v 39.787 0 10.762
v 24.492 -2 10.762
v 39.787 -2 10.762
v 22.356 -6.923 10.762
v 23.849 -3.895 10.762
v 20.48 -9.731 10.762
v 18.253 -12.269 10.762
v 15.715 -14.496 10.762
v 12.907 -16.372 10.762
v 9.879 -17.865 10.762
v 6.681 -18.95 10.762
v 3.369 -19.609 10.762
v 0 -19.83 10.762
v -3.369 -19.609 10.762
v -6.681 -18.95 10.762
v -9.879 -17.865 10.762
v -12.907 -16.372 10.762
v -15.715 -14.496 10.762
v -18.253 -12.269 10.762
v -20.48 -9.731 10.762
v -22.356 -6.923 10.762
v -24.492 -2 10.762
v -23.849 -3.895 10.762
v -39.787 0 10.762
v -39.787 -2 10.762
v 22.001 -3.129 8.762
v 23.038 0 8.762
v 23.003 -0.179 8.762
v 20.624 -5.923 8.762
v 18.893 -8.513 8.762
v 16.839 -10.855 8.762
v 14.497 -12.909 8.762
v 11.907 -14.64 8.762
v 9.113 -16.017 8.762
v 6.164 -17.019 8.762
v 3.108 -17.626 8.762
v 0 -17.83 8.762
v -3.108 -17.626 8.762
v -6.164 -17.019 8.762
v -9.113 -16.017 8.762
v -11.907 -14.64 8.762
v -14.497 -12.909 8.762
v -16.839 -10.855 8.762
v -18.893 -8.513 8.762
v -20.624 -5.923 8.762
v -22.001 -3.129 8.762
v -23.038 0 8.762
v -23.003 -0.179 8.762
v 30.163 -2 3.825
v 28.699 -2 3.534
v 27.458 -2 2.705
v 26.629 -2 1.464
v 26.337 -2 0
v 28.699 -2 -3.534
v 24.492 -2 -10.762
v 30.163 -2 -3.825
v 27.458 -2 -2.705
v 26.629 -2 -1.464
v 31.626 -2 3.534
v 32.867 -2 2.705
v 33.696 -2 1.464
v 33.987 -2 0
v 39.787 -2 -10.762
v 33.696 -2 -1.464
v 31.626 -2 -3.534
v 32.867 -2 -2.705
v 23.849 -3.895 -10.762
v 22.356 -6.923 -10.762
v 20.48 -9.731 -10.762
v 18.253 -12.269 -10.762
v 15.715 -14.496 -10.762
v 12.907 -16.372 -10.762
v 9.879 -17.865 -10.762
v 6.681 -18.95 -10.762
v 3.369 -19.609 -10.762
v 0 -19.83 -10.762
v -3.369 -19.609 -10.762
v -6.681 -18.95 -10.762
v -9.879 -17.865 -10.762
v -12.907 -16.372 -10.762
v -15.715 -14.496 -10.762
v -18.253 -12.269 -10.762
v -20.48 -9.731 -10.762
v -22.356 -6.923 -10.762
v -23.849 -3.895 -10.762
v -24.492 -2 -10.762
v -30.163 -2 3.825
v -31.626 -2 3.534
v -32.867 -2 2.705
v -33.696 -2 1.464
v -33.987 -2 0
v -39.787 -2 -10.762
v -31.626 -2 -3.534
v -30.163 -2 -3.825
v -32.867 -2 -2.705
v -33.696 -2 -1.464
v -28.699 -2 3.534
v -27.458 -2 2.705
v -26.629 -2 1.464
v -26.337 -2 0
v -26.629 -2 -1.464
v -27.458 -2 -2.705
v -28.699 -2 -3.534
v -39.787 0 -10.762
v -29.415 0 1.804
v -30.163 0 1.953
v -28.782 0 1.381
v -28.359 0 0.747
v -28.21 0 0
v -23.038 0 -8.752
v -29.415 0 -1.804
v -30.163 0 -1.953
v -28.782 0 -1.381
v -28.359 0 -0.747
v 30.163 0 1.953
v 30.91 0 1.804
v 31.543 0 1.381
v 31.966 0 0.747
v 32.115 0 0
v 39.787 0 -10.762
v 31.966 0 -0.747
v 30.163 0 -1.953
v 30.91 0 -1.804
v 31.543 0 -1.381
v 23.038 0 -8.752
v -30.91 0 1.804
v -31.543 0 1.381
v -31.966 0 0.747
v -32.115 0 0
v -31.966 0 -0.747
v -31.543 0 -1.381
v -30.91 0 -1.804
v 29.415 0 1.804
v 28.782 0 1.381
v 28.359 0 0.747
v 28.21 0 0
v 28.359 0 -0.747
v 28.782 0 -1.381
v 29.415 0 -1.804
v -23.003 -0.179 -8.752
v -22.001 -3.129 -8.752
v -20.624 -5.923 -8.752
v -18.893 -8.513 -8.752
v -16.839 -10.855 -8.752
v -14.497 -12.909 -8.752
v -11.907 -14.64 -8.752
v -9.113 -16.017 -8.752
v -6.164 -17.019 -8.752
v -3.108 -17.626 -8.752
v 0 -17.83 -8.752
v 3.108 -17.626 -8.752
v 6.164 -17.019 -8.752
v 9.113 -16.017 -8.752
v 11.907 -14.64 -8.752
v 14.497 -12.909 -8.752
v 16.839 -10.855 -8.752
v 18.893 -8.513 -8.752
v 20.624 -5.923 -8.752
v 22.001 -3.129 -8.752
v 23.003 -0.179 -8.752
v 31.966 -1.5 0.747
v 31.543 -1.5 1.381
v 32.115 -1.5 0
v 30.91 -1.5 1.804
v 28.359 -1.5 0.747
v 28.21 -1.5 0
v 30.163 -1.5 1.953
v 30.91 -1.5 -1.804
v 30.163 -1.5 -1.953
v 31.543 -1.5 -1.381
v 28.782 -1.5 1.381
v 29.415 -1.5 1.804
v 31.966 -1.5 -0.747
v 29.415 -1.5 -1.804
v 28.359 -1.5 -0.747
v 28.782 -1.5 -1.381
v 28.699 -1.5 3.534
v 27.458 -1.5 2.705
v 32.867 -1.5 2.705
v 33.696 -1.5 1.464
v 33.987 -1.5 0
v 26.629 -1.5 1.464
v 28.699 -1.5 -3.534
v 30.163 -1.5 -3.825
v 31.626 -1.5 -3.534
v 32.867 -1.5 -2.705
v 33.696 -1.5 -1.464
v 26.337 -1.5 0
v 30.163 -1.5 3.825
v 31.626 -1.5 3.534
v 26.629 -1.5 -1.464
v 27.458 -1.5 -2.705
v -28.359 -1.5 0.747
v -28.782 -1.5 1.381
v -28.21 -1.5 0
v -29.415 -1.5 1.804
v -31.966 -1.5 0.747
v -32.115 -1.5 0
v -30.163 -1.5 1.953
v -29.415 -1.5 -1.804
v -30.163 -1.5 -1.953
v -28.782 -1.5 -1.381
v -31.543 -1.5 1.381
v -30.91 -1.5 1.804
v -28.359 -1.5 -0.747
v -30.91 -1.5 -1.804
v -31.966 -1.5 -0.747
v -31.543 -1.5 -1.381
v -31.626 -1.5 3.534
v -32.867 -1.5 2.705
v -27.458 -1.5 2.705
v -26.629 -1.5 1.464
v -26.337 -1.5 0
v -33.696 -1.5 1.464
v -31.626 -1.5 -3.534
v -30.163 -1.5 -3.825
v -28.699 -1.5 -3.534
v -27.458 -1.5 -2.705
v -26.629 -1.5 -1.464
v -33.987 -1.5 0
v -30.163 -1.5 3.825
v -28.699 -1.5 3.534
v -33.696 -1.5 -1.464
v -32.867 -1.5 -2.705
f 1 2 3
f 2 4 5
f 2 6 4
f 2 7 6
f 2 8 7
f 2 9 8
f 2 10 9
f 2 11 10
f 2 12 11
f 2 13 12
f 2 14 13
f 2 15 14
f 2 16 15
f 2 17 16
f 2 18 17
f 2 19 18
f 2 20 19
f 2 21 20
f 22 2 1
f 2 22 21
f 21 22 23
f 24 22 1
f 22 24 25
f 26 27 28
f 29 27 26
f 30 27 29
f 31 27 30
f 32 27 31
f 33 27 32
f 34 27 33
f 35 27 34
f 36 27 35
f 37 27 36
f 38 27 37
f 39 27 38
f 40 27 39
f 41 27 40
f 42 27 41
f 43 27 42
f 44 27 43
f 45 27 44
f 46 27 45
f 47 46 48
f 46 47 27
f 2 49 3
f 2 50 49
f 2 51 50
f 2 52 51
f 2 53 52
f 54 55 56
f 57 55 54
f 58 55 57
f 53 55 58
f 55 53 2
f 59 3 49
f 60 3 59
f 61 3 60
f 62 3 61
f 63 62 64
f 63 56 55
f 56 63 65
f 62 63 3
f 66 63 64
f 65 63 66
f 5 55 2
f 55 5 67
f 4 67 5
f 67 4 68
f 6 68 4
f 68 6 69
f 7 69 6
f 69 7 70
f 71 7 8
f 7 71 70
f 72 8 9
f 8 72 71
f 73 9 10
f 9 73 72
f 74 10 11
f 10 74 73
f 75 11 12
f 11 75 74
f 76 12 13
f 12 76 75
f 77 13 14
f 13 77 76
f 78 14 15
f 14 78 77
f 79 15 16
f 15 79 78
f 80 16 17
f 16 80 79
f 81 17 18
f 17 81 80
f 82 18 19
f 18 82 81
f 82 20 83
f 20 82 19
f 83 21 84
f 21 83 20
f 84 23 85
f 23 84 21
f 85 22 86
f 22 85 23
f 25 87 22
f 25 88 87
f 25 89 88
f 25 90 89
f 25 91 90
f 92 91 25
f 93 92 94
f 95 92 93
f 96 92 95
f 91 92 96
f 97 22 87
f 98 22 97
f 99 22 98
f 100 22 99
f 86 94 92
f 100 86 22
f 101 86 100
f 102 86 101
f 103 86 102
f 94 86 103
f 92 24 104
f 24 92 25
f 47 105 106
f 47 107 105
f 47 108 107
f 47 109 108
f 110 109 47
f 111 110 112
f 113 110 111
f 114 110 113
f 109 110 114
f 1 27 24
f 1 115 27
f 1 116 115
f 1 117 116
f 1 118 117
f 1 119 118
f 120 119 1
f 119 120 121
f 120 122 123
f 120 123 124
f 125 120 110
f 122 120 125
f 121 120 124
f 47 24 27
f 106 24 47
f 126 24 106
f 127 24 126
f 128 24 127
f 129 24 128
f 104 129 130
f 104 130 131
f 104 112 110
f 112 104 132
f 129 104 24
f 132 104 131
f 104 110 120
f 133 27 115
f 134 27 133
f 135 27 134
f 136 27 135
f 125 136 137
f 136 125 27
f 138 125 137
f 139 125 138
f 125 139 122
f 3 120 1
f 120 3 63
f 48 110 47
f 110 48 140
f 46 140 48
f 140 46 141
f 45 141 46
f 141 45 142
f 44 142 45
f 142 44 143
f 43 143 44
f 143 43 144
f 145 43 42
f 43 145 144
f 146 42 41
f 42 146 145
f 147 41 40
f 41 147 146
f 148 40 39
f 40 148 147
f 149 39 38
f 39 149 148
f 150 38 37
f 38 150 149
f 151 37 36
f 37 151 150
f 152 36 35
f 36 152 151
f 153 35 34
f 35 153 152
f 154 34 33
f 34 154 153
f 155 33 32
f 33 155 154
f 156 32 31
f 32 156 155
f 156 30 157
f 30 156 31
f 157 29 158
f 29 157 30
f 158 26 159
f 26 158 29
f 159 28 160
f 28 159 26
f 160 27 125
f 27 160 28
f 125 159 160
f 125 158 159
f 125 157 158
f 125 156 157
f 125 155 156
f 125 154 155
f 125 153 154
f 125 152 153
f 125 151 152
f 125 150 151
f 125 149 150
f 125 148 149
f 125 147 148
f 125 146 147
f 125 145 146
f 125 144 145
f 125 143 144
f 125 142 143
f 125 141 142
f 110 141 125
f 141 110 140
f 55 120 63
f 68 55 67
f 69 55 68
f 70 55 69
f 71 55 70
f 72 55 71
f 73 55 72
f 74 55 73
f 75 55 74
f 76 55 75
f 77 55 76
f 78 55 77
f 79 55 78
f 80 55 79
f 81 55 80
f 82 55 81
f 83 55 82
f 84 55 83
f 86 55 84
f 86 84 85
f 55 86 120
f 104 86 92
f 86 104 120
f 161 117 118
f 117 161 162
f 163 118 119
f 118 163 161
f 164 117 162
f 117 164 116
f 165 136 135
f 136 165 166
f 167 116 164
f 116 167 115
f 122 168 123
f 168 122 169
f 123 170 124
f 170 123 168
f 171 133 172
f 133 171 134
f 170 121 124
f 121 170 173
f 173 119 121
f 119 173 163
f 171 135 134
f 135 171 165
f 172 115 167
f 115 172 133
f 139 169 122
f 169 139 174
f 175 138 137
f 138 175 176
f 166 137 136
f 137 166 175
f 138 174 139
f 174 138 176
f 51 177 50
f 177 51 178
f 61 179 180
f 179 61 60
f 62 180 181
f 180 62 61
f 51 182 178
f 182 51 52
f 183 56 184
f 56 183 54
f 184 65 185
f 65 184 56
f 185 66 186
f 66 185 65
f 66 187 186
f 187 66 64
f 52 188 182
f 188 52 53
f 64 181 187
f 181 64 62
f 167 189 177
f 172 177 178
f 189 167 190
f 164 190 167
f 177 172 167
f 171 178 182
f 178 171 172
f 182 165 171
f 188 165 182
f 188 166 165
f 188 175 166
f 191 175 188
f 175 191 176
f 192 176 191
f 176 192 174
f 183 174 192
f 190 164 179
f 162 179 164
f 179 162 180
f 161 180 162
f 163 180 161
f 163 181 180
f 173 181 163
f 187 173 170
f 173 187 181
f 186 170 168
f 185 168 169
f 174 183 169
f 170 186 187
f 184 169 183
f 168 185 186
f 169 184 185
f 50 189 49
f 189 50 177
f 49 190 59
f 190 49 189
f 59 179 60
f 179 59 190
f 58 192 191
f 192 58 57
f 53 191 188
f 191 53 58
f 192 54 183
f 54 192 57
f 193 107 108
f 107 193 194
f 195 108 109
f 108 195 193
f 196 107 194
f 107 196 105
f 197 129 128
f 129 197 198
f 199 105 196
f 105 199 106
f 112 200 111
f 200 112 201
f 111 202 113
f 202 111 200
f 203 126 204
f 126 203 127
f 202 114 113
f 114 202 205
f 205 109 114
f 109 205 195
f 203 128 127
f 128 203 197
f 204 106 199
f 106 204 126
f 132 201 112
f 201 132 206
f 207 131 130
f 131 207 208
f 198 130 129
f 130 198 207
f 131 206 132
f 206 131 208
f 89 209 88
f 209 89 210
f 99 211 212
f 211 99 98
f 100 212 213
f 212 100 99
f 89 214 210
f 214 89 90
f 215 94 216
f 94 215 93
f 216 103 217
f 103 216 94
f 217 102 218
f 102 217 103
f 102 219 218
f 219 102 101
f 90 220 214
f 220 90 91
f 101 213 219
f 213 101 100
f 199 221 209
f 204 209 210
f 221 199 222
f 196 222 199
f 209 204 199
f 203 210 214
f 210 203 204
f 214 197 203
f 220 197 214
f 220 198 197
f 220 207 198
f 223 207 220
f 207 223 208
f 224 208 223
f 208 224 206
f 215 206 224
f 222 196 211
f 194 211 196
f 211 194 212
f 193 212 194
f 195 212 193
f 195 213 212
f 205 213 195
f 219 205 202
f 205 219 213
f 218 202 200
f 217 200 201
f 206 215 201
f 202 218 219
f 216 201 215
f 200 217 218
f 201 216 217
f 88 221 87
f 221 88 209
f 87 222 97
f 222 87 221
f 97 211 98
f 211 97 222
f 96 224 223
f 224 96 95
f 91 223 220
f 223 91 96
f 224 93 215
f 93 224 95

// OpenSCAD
inch = 25.4;

screwSpacing = (2+3/8)*inch;
screwHole = 0.138*inch;
switchWidth = 3/8*inch;
switchHeight = 1*inch;
switchStickout = 13.83;
screwHead = 7.25;
beyondScrews = screwHead/2+6;
screwTolerance = 0.2;

wall = 2;
minWall = 1.5;

tolerance = 4;

insideWidth = switchWidth + 2*tolerance;
chord = switchHeight * 1.5 + 2*tolerance;
sagitta = switchStickout + tolerance;
R = sagitta/2+chord*chord/(8*sagitta);

nudge = 0.01;

module profile(full=false) {
    $fn = 48;
    render(convexity=2)
    intersection() {
    difference() {
        union() {
            translate([0,-R+sagitta]) circle(r=R+wall);
            translate([-beyondScrews-screwSpacing/2,0]) square([beyondScrews*2+screwSpacing,wall]);
        }
        if (!full) translate([0,-R+sagitta]) circle(r=R);
    }
        translate([-beyondScrews-screwSpacing/2,0]) square([beyondScrews*2+screwSpacing,sagitta+wall]);
    }
}

module positive() {
    linear_extrude(height=wall) profile(full=true);
    linear_extrude(height=wall+switchWidth+2*tolerance) profile(full=false);
    translate([0,0,wall+switchWidth+2*tolerance-nudge])
    linear_extrude(height=wall+nudge) profile(full=true);
    
}

module screwHole() {
    $fn=16;
    translate([0,0,-nudge])
        cylinder(d=screwHole+2*screwTolerance,h=wall+2*nudge);
    translate([0,0,minWall])
        cylinder(d=screwHead+2*screwTolerance,h=wall);
}

rotate([90,0,0])
render(convexity=4)
difference() {
    translate([0,wall+switchWidth/2+tolerance,0])
    rotate([90,0,0])
    positive();
    translate([screwSpacing/2,0,0]) screwHole();
    translate([-screwSpacing/2,0,0]) screwHole();
}
